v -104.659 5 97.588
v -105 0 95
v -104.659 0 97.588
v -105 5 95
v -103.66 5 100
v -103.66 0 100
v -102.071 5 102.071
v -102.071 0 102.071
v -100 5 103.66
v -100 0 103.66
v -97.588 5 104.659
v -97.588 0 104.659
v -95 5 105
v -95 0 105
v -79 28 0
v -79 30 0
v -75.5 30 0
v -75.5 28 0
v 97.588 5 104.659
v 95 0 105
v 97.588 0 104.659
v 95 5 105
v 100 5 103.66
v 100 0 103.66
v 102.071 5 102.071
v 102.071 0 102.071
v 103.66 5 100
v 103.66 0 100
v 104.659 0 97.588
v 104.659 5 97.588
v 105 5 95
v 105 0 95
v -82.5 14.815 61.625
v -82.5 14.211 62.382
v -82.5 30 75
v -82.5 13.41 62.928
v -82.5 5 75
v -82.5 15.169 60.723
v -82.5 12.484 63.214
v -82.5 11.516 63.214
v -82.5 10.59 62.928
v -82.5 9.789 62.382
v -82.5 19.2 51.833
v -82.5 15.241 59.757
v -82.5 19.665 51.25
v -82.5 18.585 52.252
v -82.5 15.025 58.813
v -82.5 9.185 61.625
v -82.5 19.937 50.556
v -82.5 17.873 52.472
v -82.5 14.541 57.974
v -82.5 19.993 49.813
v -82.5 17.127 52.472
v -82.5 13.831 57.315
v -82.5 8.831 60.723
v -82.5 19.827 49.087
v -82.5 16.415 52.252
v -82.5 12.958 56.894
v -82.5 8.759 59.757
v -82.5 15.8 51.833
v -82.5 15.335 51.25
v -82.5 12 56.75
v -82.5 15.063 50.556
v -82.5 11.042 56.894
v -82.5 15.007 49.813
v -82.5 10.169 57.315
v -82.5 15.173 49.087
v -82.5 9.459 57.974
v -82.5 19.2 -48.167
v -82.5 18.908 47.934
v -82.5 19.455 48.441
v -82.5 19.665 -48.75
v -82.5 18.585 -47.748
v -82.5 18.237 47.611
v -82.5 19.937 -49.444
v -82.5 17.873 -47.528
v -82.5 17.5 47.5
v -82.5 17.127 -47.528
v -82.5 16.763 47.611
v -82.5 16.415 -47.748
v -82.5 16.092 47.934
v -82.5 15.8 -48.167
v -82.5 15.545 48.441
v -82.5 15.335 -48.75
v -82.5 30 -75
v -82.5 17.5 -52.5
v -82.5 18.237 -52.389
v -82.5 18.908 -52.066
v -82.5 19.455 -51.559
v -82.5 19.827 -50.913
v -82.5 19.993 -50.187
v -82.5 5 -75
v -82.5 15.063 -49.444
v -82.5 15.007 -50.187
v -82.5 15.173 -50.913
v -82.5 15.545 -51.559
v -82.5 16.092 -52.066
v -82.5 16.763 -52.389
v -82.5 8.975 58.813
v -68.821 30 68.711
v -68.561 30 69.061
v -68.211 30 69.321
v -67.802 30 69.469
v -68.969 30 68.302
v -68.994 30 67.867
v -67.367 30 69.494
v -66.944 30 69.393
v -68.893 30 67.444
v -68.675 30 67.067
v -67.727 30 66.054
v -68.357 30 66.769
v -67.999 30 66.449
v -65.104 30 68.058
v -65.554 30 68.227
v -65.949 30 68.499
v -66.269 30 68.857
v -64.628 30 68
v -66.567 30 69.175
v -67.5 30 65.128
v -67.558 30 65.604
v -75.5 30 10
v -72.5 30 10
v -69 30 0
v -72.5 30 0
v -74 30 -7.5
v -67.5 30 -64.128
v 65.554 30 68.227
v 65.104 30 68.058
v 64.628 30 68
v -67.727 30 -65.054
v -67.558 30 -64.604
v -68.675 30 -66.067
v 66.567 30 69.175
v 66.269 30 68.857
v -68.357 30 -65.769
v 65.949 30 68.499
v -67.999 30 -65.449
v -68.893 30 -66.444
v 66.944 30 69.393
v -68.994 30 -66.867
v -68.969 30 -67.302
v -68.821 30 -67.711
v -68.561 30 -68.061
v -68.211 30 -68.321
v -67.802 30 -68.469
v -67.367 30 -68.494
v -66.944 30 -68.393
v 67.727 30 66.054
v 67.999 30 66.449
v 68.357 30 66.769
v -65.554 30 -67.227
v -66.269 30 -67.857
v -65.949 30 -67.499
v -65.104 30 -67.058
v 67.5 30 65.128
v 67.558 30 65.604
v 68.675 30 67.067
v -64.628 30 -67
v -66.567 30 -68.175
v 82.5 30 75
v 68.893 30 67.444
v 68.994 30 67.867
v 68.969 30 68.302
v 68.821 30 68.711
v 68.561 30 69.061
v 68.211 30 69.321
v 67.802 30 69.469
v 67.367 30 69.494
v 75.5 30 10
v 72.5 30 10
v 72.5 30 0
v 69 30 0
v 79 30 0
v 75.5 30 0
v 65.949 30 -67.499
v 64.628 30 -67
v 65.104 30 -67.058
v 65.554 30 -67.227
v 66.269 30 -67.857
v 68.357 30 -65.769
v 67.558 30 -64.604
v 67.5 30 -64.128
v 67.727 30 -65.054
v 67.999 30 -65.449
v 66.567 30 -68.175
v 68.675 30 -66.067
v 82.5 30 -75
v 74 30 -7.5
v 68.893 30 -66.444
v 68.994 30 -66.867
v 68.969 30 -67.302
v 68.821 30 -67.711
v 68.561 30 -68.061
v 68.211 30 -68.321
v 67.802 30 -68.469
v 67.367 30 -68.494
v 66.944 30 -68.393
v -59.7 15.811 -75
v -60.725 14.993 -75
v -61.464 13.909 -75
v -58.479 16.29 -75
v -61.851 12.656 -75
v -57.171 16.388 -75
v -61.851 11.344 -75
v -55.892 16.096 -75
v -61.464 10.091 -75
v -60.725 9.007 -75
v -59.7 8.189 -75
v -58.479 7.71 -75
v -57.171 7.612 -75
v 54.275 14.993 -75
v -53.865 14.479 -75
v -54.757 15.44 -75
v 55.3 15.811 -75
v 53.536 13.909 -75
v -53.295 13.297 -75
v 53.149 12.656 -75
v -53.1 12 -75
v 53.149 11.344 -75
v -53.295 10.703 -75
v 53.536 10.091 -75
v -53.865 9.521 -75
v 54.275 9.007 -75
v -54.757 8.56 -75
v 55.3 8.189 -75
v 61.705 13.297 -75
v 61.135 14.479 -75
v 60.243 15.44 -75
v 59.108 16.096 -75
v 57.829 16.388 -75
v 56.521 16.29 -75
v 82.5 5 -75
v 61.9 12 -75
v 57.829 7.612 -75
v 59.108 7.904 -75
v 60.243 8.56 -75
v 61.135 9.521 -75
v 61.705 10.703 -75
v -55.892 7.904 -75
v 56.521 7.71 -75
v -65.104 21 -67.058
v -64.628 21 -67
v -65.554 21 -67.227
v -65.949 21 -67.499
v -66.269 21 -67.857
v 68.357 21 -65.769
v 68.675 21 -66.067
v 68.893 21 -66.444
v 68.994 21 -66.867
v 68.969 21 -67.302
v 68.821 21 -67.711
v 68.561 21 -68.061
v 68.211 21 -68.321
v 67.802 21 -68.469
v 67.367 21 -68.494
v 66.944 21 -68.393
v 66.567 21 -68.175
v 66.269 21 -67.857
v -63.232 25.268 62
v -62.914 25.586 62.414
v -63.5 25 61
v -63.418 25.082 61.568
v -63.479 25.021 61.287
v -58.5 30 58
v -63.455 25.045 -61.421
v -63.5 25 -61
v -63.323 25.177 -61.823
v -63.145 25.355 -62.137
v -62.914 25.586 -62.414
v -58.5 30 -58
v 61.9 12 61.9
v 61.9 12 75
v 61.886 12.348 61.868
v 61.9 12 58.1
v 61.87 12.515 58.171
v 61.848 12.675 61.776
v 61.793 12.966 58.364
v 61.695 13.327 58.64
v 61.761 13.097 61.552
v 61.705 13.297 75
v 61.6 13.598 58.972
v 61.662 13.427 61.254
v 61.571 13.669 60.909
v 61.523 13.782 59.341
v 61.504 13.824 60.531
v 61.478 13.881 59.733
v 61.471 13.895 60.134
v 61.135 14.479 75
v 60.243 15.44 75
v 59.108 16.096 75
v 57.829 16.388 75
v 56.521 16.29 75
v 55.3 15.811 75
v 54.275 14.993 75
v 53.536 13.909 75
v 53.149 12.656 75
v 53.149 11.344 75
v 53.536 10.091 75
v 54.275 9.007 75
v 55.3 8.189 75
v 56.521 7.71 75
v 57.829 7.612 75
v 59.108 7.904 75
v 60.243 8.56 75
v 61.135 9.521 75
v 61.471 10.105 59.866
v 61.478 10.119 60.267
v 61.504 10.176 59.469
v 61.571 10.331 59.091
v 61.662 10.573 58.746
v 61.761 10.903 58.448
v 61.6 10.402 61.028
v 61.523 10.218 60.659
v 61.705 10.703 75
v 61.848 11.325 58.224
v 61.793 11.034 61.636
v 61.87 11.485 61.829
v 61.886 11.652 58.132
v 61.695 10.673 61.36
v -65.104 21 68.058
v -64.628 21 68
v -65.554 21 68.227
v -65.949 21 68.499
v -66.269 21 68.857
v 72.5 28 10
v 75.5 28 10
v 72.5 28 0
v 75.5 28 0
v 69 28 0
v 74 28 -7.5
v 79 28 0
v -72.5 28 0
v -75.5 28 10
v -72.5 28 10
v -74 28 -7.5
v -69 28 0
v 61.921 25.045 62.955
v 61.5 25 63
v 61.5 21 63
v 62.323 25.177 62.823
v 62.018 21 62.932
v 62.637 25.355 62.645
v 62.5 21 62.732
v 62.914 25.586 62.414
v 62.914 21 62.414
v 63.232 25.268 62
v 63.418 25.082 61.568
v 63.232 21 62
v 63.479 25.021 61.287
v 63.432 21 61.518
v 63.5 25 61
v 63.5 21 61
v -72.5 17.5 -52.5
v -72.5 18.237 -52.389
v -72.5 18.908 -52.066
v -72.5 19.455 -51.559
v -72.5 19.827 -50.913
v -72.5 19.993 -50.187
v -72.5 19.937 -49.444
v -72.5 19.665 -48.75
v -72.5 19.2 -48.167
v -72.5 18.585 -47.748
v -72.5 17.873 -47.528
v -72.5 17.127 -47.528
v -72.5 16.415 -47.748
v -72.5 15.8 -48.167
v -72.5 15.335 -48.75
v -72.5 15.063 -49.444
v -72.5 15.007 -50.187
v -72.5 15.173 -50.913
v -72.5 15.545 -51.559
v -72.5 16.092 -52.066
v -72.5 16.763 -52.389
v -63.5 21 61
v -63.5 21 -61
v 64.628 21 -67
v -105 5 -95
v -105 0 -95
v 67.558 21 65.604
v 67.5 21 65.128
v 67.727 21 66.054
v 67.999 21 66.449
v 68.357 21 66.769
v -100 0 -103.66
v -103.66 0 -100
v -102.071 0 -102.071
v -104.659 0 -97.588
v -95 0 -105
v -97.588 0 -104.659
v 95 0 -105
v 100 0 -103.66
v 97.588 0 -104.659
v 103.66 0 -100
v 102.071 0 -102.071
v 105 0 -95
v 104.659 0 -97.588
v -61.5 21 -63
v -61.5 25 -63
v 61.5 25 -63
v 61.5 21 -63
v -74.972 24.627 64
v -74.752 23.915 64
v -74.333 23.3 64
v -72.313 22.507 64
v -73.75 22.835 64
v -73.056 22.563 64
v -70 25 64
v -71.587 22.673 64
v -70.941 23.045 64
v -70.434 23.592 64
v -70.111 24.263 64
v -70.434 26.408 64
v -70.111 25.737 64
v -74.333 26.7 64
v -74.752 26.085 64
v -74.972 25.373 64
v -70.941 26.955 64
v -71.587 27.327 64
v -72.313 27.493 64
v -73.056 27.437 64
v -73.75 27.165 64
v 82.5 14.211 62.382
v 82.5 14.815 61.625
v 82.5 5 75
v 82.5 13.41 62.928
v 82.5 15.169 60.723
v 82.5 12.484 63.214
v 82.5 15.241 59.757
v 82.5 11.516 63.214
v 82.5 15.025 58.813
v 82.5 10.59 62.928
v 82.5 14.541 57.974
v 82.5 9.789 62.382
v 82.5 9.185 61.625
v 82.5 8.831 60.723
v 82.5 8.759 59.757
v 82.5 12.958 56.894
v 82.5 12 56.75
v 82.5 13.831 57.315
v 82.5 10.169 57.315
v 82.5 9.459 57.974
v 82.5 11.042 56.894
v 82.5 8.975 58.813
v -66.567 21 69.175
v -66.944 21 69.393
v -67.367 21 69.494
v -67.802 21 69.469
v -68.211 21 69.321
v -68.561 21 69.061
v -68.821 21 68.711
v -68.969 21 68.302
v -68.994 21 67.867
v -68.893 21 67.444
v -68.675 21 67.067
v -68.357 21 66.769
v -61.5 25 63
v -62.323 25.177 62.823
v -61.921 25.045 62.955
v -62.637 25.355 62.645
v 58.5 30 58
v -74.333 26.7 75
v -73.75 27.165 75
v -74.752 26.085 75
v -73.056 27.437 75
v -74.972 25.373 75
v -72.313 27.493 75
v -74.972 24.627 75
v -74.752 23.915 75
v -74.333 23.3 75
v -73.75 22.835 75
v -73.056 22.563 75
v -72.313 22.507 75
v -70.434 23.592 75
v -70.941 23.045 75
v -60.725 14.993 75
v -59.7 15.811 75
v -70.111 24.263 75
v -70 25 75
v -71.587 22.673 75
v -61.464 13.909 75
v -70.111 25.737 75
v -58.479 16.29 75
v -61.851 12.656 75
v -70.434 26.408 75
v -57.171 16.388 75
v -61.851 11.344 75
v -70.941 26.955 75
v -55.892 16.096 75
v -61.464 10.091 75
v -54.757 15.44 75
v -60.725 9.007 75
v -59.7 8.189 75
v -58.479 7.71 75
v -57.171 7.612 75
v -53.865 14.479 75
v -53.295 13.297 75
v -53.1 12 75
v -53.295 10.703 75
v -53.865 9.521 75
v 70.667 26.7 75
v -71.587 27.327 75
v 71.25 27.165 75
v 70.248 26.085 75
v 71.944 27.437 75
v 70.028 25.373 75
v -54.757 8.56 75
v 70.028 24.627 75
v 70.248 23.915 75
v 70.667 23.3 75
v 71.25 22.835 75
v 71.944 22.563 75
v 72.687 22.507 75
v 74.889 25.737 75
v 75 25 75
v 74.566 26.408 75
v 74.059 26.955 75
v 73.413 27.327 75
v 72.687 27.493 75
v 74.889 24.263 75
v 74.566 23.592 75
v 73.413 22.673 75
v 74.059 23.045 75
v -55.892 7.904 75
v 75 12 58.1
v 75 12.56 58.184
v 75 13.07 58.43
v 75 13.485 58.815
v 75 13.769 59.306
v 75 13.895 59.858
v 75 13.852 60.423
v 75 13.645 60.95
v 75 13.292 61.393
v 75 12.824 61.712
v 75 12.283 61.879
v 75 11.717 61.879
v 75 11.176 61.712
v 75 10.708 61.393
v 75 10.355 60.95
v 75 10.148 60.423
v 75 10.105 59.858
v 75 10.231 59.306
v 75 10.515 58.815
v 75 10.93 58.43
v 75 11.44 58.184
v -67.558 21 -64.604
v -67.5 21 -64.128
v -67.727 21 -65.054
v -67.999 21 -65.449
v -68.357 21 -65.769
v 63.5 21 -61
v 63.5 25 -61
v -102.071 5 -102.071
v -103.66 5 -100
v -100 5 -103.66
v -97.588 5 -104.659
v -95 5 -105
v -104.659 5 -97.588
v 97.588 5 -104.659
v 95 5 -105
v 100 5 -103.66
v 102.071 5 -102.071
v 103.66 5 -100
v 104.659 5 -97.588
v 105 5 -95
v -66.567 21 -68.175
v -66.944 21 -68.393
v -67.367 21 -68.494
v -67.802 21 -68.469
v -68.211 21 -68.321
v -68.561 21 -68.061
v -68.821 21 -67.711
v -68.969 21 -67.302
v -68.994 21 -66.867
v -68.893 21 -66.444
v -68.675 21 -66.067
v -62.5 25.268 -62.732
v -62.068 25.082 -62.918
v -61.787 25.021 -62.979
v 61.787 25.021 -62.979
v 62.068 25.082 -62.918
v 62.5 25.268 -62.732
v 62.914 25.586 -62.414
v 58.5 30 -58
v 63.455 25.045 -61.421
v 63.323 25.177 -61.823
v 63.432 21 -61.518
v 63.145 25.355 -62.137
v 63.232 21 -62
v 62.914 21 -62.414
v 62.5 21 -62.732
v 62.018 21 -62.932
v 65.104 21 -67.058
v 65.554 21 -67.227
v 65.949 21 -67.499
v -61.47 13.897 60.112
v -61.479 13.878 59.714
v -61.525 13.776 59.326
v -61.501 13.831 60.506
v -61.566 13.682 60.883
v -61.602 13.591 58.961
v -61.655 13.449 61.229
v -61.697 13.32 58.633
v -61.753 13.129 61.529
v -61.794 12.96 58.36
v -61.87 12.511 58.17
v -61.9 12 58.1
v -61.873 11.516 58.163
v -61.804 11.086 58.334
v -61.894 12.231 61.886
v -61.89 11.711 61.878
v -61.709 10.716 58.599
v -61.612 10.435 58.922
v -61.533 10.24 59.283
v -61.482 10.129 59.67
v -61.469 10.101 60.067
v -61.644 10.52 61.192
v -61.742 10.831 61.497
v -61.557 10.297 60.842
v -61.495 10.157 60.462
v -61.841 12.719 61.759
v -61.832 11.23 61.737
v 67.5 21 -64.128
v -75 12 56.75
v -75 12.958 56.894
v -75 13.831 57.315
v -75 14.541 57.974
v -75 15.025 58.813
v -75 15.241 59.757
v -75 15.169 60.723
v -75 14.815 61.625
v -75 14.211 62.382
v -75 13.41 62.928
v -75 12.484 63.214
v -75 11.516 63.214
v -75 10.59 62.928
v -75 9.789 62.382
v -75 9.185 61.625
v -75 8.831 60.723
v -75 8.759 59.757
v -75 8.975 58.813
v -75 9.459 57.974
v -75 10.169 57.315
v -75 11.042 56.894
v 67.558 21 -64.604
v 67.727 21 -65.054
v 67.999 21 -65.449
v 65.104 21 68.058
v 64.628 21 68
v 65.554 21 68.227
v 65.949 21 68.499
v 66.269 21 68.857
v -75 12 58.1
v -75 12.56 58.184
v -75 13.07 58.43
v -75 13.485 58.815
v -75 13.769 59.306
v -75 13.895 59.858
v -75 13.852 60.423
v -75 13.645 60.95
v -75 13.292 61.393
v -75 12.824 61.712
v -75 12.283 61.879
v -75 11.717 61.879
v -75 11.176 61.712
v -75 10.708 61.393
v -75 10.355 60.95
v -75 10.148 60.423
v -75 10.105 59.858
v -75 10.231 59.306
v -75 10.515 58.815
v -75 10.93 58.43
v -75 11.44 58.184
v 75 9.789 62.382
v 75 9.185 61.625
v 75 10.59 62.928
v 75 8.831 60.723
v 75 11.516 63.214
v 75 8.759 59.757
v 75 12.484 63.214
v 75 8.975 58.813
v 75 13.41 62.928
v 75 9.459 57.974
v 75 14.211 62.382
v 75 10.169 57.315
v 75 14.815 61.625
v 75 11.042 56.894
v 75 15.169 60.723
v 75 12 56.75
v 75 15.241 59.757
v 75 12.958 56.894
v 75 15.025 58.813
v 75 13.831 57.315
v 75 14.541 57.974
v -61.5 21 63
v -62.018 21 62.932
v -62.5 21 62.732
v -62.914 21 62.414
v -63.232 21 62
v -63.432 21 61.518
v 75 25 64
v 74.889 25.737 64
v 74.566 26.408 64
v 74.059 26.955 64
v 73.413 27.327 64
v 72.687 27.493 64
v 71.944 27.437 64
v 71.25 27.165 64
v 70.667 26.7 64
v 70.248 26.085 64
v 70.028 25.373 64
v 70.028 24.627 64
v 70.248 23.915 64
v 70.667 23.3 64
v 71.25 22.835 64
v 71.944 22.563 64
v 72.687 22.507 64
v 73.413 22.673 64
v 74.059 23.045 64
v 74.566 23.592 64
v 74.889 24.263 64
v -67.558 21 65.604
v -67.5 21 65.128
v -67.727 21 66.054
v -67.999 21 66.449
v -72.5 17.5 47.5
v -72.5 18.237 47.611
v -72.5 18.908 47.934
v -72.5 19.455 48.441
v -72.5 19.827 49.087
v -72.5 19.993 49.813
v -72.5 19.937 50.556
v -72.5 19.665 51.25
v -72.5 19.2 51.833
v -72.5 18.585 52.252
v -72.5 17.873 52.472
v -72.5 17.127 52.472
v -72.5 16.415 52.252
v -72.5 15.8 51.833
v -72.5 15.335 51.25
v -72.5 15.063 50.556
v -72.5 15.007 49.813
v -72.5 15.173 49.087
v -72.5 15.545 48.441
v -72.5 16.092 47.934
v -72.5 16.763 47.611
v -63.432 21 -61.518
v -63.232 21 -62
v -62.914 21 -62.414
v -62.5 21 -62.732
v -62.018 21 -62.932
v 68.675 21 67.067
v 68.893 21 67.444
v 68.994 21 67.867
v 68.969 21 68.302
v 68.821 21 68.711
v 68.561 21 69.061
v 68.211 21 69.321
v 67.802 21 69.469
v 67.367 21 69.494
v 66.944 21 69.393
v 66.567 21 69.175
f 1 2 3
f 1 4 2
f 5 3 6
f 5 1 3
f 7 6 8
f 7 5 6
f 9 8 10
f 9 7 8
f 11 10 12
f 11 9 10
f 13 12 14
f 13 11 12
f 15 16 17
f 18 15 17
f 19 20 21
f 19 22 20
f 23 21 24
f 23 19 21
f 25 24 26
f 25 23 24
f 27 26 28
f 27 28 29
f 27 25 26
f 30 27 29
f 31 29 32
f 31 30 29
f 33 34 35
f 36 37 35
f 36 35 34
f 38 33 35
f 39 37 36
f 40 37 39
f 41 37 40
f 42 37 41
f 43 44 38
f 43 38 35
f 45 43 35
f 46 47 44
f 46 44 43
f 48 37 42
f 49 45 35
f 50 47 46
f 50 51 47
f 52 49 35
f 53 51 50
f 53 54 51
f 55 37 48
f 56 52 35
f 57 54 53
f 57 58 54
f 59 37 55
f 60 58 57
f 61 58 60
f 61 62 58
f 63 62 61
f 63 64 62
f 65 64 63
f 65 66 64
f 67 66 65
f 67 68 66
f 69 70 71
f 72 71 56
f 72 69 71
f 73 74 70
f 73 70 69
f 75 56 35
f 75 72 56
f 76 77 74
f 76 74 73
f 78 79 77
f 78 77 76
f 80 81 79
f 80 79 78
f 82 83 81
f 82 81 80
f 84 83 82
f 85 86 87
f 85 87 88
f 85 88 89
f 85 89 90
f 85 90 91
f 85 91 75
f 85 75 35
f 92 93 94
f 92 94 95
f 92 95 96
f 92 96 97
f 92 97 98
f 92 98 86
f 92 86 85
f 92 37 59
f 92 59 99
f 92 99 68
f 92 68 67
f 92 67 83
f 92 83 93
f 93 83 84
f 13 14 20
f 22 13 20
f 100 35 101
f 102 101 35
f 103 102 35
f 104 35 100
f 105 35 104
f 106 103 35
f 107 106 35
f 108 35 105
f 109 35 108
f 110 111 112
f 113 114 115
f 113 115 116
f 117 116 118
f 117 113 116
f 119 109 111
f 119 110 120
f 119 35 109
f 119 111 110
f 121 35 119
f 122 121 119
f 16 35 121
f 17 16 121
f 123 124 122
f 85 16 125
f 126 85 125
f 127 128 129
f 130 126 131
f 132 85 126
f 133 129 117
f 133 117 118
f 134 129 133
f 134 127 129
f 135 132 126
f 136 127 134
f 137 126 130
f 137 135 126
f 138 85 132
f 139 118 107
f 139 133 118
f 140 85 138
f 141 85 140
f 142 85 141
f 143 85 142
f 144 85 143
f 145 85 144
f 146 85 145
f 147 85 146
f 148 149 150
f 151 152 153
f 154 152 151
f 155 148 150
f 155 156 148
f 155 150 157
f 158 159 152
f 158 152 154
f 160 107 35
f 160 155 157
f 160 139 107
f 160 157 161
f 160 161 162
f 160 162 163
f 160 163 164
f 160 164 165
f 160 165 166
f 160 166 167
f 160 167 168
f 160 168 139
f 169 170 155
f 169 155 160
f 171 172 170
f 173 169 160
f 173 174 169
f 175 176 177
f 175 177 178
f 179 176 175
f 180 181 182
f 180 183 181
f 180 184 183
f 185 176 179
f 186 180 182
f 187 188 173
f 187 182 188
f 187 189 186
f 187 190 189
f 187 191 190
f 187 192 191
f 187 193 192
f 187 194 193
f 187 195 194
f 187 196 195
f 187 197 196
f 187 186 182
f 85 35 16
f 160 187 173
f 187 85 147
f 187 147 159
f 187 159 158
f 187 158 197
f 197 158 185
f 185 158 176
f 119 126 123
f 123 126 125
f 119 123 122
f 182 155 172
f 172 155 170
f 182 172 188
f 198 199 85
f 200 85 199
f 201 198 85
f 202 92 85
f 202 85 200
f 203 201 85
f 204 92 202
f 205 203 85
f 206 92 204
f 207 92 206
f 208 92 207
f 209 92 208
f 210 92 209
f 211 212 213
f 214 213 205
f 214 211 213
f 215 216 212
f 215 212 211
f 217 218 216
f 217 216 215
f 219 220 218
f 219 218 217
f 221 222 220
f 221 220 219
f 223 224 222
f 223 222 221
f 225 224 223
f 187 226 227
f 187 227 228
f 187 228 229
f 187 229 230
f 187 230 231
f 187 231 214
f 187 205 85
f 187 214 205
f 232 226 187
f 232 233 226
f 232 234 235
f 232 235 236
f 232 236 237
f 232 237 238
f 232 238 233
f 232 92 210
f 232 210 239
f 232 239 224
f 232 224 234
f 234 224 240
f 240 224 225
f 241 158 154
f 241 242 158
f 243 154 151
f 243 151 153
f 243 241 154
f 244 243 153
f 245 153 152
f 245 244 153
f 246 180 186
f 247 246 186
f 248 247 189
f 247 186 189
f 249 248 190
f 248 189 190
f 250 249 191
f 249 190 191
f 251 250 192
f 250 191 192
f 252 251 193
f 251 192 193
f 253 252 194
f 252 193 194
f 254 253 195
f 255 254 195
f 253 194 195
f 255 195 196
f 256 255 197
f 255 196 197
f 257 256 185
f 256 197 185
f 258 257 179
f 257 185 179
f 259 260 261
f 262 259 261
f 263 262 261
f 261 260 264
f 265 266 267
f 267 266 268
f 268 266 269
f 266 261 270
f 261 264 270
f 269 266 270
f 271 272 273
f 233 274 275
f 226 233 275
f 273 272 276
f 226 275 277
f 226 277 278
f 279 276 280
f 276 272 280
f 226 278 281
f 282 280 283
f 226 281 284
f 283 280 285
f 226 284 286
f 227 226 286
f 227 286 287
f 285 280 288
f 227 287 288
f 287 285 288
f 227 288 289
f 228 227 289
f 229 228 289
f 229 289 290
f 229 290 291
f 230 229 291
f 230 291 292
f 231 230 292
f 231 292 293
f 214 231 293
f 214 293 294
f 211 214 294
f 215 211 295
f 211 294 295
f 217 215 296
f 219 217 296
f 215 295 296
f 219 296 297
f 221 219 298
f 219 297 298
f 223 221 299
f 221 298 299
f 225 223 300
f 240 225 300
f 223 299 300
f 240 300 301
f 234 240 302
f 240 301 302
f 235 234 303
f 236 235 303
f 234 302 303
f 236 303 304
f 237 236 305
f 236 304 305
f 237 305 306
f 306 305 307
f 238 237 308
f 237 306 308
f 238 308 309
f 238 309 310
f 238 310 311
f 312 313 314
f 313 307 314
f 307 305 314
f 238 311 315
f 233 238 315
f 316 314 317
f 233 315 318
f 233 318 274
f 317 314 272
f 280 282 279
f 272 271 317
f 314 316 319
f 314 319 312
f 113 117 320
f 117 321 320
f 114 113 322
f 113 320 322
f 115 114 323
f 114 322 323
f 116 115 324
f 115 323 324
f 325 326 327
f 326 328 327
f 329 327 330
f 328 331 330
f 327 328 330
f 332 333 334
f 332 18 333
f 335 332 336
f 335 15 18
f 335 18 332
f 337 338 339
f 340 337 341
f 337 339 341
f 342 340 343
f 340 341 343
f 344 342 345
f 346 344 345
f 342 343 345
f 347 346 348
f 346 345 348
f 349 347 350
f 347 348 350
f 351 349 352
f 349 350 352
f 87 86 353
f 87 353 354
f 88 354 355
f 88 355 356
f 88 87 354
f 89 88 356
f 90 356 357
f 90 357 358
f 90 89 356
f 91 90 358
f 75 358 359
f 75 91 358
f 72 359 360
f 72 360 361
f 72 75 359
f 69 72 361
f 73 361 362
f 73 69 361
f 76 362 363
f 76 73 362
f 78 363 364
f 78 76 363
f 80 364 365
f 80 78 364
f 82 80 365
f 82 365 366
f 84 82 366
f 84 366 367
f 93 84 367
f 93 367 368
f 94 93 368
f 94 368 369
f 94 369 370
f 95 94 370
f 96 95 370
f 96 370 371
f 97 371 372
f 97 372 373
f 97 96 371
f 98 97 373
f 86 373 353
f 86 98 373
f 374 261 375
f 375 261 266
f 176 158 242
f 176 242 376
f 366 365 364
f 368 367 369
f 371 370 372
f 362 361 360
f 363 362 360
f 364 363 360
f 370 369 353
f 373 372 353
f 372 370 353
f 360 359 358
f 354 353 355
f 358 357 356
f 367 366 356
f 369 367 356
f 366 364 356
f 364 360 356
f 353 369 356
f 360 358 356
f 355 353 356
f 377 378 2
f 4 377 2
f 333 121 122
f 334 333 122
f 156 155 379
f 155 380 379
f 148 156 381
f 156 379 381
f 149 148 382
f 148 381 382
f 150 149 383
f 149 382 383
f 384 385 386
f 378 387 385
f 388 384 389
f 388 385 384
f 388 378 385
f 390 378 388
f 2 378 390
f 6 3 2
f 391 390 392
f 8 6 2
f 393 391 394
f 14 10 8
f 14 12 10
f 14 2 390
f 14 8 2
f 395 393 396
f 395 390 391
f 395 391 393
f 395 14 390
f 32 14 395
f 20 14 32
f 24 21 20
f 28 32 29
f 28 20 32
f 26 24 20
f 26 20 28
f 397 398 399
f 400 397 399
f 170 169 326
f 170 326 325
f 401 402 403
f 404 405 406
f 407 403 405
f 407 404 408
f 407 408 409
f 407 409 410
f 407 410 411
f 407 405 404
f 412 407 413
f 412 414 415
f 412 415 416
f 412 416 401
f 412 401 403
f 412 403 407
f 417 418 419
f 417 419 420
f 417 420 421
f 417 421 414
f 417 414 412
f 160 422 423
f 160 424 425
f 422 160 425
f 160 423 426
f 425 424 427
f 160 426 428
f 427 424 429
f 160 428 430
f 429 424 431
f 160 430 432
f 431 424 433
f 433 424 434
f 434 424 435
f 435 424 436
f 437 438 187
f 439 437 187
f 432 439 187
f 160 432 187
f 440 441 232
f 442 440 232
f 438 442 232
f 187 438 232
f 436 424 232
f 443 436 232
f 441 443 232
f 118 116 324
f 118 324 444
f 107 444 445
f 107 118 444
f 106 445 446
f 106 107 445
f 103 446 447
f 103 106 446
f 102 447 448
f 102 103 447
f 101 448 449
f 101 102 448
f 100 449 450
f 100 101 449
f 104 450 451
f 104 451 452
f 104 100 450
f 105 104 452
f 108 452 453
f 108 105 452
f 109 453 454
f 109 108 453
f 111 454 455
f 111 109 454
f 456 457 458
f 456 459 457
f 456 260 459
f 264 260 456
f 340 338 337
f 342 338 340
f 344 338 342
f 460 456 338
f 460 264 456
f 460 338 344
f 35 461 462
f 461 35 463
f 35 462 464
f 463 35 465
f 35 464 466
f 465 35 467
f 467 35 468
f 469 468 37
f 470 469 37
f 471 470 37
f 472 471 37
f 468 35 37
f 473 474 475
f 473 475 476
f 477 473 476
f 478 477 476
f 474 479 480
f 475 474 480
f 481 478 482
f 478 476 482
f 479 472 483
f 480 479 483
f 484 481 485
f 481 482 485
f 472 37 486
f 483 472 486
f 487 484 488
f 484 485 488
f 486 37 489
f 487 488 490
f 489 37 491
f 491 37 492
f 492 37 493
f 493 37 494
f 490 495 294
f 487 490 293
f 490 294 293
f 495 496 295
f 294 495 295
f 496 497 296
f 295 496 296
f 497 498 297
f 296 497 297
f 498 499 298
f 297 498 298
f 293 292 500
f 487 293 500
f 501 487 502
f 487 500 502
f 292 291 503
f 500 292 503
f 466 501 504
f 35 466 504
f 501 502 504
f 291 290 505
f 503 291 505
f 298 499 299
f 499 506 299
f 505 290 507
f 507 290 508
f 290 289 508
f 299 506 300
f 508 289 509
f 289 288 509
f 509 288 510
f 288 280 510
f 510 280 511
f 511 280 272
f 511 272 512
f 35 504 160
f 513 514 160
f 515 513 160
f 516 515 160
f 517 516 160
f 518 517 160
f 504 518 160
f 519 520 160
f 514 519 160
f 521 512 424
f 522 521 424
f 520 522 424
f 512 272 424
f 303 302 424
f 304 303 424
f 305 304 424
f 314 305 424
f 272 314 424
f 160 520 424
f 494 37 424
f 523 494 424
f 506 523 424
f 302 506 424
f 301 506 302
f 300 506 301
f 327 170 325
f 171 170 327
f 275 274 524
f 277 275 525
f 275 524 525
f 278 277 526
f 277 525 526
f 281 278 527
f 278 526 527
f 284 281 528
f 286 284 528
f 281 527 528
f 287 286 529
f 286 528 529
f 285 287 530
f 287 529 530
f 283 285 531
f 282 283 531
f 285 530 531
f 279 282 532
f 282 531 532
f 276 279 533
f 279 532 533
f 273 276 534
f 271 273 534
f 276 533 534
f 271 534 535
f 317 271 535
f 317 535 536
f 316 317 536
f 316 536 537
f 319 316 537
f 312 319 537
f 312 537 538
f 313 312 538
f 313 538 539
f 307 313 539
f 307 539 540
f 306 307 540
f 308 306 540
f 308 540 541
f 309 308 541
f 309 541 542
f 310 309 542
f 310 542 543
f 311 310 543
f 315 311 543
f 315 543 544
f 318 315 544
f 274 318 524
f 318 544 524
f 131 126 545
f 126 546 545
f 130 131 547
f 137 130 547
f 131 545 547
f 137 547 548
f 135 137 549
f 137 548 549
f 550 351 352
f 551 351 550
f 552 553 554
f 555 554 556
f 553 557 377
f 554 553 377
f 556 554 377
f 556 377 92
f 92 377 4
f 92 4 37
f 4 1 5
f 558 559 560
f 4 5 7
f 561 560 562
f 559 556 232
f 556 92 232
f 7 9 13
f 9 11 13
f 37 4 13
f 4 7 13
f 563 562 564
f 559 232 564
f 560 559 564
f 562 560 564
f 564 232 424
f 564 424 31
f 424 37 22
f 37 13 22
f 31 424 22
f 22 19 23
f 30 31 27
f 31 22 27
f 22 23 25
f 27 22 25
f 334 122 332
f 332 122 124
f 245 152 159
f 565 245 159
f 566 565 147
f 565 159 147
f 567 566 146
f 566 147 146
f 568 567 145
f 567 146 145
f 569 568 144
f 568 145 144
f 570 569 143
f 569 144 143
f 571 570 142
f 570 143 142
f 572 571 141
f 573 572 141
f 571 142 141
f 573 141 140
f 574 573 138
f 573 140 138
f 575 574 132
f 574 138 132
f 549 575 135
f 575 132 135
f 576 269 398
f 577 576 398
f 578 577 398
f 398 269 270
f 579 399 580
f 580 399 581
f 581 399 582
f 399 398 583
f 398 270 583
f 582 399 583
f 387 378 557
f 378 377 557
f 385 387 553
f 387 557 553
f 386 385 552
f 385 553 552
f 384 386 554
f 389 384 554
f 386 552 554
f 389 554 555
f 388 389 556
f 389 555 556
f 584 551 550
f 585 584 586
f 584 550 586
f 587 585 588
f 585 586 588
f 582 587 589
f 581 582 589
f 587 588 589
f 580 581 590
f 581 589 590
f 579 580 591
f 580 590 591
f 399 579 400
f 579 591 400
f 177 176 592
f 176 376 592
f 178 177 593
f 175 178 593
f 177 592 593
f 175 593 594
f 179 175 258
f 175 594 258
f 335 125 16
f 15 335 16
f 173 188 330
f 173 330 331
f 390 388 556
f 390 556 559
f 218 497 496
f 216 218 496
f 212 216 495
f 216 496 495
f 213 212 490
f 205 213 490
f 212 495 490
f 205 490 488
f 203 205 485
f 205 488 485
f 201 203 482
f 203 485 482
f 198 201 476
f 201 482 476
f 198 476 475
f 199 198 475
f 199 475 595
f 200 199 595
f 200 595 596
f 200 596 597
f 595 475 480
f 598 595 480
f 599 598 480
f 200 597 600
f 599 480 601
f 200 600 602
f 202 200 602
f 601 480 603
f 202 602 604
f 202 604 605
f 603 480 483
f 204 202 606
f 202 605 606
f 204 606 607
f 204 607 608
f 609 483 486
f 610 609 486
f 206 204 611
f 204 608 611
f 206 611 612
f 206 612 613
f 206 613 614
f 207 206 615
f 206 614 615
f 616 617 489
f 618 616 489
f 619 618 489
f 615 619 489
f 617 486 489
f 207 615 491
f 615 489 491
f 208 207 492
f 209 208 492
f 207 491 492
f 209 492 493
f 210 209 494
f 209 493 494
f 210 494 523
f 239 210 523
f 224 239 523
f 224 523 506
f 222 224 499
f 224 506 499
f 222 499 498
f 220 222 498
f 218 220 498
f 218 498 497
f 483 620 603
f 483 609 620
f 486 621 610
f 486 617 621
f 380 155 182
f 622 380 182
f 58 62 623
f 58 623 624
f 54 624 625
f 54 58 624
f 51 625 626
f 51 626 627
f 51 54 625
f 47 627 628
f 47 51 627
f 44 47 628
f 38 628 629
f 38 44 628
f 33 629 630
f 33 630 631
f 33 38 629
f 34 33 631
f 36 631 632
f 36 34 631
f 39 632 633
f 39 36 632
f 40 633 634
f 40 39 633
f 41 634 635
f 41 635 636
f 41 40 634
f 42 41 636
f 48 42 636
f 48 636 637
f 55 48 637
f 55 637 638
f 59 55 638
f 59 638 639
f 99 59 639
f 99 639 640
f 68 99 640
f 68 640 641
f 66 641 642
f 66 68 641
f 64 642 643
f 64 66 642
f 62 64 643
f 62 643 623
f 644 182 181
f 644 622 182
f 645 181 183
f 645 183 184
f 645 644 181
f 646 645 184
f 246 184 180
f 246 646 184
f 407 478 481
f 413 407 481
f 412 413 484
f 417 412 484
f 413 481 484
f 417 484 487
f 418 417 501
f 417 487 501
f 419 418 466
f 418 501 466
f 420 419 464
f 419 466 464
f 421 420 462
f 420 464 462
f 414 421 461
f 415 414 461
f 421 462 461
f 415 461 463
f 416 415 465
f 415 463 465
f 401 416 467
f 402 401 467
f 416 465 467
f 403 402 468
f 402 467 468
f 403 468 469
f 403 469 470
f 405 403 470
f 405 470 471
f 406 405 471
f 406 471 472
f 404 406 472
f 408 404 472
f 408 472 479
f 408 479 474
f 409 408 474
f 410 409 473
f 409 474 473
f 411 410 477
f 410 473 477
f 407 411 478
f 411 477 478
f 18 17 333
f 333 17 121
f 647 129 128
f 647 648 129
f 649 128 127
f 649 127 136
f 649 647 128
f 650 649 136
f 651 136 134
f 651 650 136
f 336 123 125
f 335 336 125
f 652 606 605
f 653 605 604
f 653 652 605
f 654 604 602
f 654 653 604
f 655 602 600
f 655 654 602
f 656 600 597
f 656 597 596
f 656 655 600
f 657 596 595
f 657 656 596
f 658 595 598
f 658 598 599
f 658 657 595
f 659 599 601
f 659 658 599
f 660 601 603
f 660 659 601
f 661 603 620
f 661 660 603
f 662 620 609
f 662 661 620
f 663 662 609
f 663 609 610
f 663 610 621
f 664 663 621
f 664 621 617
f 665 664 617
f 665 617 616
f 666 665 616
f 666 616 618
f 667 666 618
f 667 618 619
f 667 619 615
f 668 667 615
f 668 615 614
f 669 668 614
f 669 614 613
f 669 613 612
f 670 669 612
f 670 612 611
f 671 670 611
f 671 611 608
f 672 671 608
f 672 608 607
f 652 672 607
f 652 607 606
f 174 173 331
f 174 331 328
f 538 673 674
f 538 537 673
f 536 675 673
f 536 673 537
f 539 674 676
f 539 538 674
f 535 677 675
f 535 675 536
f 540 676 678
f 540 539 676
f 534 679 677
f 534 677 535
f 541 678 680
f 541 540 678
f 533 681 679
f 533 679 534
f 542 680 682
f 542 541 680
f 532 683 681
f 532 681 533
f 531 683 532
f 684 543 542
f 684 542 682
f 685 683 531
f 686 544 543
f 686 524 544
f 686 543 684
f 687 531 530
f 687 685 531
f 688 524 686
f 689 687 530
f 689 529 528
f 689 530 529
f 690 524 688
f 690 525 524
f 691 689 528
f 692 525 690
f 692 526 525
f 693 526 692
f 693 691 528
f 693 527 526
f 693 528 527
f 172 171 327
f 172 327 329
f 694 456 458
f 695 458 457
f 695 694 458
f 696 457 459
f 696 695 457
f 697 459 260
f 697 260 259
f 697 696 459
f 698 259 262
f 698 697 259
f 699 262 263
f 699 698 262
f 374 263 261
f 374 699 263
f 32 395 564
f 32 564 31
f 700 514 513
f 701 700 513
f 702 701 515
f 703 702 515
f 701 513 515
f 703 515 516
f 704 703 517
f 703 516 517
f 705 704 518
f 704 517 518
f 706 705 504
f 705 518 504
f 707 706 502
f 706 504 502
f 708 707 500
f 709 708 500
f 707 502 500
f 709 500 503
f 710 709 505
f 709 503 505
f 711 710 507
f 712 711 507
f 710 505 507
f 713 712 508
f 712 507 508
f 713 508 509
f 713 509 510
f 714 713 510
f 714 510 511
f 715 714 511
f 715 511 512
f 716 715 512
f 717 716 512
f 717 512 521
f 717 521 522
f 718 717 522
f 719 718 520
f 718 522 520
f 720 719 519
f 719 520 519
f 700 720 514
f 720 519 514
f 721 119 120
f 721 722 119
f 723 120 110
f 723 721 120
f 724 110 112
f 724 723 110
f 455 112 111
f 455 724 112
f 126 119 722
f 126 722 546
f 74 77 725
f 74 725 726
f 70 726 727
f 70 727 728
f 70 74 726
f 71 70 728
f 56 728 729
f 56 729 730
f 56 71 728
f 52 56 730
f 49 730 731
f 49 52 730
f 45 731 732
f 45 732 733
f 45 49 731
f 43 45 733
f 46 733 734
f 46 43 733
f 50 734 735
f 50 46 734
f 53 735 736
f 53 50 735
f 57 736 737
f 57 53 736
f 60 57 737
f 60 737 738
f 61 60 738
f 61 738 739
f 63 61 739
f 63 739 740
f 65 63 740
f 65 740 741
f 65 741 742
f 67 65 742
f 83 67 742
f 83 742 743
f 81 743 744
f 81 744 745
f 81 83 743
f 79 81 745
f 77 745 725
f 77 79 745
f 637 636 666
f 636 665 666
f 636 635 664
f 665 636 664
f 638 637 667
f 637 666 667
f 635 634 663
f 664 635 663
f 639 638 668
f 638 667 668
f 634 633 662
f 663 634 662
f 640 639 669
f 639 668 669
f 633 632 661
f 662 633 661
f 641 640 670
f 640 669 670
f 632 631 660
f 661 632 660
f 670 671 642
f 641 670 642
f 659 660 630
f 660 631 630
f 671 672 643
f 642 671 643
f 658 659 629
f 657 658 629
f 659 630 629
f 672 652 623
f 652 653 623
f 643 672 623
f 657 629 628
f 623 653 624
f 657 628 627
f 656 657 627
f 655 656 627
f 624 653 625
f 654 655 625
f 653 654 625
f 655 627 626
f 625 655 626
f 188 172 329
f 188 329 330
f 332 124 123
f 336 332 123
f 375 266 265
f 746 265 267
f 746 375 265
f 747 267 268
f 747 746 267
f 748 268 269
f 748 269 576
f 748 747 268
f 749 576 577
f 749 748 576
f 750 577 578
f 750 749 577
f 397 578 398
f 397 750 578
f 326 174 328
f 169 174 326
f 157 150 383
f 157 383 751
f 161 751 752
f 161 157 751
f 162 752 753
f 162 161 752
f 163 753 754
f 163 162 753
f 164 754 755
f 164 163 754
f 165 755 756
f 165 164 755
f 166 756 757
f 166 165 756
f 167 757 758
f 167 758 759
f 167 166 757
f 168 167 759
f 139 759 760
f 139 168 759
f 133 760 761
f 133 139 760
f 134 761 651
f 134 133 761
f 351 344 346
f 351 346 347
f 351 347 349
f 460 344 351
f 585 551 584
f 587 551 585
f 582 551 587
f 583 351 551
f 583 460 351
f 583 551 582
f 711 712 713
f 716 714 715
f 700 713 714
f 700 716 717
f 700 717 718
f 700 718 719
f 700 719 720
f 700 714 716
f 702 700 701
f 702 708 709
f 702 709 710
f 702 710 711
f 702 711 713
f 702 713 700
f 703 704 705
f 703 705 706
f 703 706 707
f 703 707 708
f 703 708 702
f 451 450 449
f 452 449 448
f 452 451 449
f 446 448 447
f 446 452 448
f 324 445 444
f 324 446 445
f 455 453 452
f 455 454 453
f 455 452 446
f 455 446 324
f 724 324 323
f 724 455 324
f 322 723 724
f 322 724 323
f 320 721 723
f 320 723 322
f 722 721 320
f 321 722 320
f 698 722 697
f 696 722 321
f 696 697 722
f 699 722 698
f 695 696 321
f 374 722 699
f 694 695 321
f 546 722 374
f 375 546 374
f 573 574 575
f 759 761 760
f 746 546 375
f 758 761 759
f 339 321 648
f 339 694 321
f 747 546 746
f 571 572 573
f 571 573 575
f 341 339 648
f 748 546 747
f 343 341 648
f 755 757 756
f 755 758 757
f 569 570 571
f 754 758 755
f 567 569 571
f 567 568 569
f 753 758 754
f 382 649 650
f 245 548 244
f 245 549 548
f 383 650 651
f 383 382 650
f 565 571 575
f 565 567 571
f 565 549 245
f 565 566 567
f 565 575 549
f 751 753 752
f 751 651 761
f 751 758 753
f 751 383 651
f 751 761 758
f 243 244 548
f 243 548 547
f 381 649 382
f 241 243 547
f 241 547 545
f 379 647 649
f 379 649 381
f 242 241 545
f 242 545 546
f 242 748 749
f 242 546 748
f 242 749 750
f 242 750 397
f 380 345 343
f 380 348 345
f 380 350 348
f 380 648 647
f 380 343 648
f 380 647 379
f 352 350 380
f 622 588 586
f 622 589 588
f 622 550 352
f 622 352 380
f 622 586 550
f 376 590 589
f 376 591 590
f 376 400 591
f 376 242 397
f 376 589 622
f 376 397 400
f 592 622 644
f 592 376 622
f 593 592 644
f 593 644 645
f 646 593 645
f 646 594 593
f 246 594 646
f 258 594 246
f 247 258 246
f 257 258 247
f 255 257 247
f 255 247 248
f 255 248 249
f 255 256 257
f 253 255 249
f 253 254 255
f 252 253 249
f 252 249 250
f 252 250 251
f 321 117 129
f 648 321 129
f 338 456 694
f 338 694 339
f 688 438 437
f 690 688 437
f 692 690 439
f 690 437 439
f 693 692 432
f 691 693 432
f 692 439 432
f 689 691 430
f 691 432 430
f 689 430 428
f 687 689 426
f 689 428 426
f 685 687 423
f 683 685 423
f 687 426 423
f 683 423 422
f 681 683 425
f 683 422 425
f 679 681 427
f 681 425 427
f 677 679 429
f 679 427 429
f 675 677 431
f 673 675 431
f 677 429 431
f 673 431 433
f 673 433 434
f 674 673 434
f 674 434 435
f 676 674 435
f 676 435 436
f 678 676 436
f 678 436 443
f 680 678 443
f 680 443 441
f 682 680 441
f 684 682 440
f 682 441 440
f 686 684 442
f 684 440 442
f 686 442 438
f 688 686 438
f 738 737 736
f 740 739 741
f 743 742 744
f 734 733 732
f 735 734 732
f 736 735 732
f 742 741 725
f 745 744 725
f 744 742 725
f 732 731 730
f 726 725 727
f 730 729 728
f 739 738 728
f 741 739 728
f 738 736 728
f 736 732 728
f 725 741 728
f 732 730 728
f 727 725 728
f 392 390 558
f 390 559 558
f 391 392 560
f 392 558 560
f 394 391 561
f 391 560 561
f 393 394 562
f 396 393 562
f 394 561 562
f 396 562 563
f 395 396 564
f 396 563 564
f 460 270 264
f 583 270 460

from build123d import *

# Parameters (mm, degrees)
SKETCH1_W           = 165
SKETCH1_H           = 150
BOSS_EXTRUDE1_DEPTH = 30
SKETCH2_W           = 135
SKETCH2_H           = 135
SKETCH2_W_2         = 127
SKETCH2_H_2         = 126
CUT_EXTRUDE1_DEPTH  = 9
CUT_EXTRUDE2_DEPTH  = 2
SKETCH4_R           = 2.5
CUT_EXTRUDE3_DEPTH  = 11
SKETCH5_W           = 210
SKETCH5_H           = 210
BOSS_EXTRUDE2_DEPTH = 5
FILLET1_R           = 10
SKETCH6_R           = 4.4
CUT_EXTRUDE4_DEPTH  = 211.535032714
CHAMFER1_SIZE       = 5
CUT_EXTRUDE5_DEPTH  = 9
FILLET2_R           = 2
SKETCH8_R           = 1.9
CUT_EXTRUDE6_DEPTH  = 25
SKETCH10_R          = 3.25
CUT_EXTRUDE8_DEPTH  = 7.5
SKETCH9_R           = 2.5
CUT_EXTRUDE7_DEPTH  = 10


with BuildPart() as part:
    # Sketch1 → Boss-Extrude1 (new body)
    with BuildSketch(Plane(origin=(0, 0, 0), x_dir=(1, 0, 0), z_dir=(0, 1, 0))):
        Rectangle(SKETCH1_W, SKETCH1_H)
    extrude(amount=BOSS_EXTRUDE1_DEPTH)

    # Sketch2 → Cut-Extrude1 (cut)
    with BuildSketch(Plane(origin=(0, 30, 0), x_dir=(1, 0, 0), z_dir=(0, 1, 0))):
        with Locations((0, -0.5)):
            Rectangle(SKETCH2_W, SKETCH2_H)
        Rectangle(SKETCH2_W_2, SKETCH2_H_2, mode=Mode.SUBTRACT)
    extrude(amount=-CUT_EXTRUDE1_DEPTH, mode=Mode.SUBTRACT)

    # Sketch3 → Cut-Extrude2 (cut)
    with BuildSketch(Plane(origin=(0, 30, 0), x_dir=(1, 0, 0), z_dir=(0, 1, 0))):
        Polygon((75.5, -10), (72.5, -10), (72.5, 0), (69, 0), (74, 7.5), (79, 0), (75.5, 0), align=None)
    cut_extrude2 = extrude(amount=-CUT_EXTRUDE2_DEPTH, mode=Mode.SUBTRACT)

    # Mirror1: Cut-Extrude2 across plane
    add(cut_extrude2.mirror(Plane(origin=(0, 0, 0), x_dir=(0, 0, 1), z_dir=(1, 0, 0))), mode=Mode.SUBTRACT)

    # Sketch4 → Cut-Extrude3 (cut)
    with BuildSketch(Plane.XY.offset(75)):
        with Locations((72.5, 25)):
            Circle(SKETCH4_R)
        with Locations((-72.5, 25)):
            Circle(SKETCH4_R)
    extrude(amount=-CUT_EXTRUDE3_DEPTH, mode=Mode.SUBTRACT)

    # Sketch5 → Boss-Extrude2 (add)
    with BuildSketch(Plane.XZ):
        Rectangle(SKETCH5_W, SKETCH5_H)
    extrude(amount=-BOSS_EXTRUDE2_DEPTH)

    # Fillet1
    fillet1_edges = [part.edges().sort_by_distance(p)[0] for p in [
        (105, 2.5, 105),
        (105, 2.5, -105),
        (-105, 2.5, -105),
        (-105, 2.5, 105),
    ]]
    fillet(fillet1_edges, radius=FILLET1_R)

    # Sketch6 → Cut-Extrude4 (cut, through all)
    with BuildSketch(Plane.XY.offset(75)):
        with Locations((-57.5, 12)):
            Circle(SKETCH6_R)
        with Locations((57.5, 12)):
            Circle(SKETCH6_R)
    extrude(amount=-CUT_EXTRUDE4_DEPTH, mode=Mode.SUBTRACT)

    # Chamfer1
    chamfer1_edges = [part.edges().sort_by_distance(p)[0] for p in [
        (63.5, 30, 0),
        (0, 30, 63),
        (-63.5, 30, 0),
        (0, 30, -63),
    ]]
    chamfer(chamfer1_edges, length=CHAMFER1_SIZE)

    # Sketch7 → Cut-Extrude5 (cut)
    with BuildSketch(Plane(origin=(0, 30, 0), x_dir=(1, 0, 0), z_dir=(0, 1, 0))):
        with BuildLine():
            Line((-67.5, 65.5), (-67.5, 67))
            Line((-67.5, 67), (-66, 67))
            ThreePointArc((-66, 67), (-68.560660172, 68.060660172), (-67.5, 65.5))
        make_face()
        with BuildLine():
            Line((66, 67), (67.5, 67))
            Line((67.5, 67), (67.5, 65.5))
            ThreePointArc((67.5, 65.5), (68.560660172, 68.060660172), (66, 67))
        make_face()
        with BuildLine():
            Line((66, -68), (67.5, -68))
            Line((67.5, -68), (67.5, -66.5))
            ThreePointArc((67.5, -66.5), (68.560660172, -69.060660172), (66, -68))
        make_face()
        with BuildLine():
            Line((-67.5, -66.5), (-67.5, -68))
            Line((-67.5, -68), (-66, -68))
            ThreePointArc((-66, -68), (-68.560660172, -69.060660172), (-67.5, -66.5))
        make_face()
    extrude(amount=-CUT_EXTRUDE5_DEPTH, mode=Mode.SUBTRACT)

    # Fillet2
    fillet2_edges = [part.edges().sort_by_distance(p)[0] for p in [
        (-67.5, 25.5, 66.5),
        (-66, 25.5, 68),
        (66, 25.5, 68),
        (67.5, 25.5, 66.5),
        (67.5, 25.5, -65.5),
        (66, 25.5, -67),
        (-67.5, 25.5, -65.5),
        (-66, 25.5, -67),
        (63.5, 23, 63),
        (-63.5, 23, 63),
        (-63.5, 23, -63),
        (63.5, 23, -63),
    ]]
    fillet(fillet2_edges, radius=FILLET2_R)

    # Sketch8 → Cut-Extrude6 (cut)
    with BuildSketch(Plane(origin=(82.5, 0, 0), x_dir=(0, 0, -1), z_dir=(1, 0, 0))):
        with Locations((-60, 12)):
            Circle(SKETCH8_R)
    cut_extrude6 = extrude(amount=-CUT_EXTRUDE6_DEPTH, mode=Mode.SUBTRACT)

    # Sketch10 → Cut-Extrude8 (cut)
    with BuildSketch(Plane(origin=(82.5, 0, 0), x_dir=(0, 0, -1), z_dir=(1, 0, 0))):
        with Locations((-60, 12)):
            Circle(SKETCH10_R)
    cut_extrude8 = extrude(amount=-CUT_EXTRUDE8_DEPTH, mode=Mode.SUBTRACT)

    # Mirror2: Cut-Extrude6, Cut-Extrude8 across plane
    add(cut_extrude6.mirror(Plane(origin=(0, 0, 0), x_dir=(0, 0, 1), z_dir=(1, 0, 0))), mode=Mode.SUBTRACT)
    add(cut_extrude8.mirror(Plane(origin=(0, 0, 0), x_dir=(0, 0, 1), z_dir=(1, 0, 0))), mode=Mode.SUBTRACT)

    # Sketch9 → Cut-Extrude7 (cut)
    with BuildSketch(Plane(origin=(-82.5, 0, 0), x_dir=(0, 0, -1), z_dir=(1, 0, 0))):
        with Locations((-50, 17.5)):
            Circle(SKETCH9_R)
        with Locations((50, 17.5)):
            Circle(SKETCH9_R)
    extrude(amount=CUT_EXTRUDE7_DEPTH, mode=Mode.SUBTRACT)


solid = part.part
